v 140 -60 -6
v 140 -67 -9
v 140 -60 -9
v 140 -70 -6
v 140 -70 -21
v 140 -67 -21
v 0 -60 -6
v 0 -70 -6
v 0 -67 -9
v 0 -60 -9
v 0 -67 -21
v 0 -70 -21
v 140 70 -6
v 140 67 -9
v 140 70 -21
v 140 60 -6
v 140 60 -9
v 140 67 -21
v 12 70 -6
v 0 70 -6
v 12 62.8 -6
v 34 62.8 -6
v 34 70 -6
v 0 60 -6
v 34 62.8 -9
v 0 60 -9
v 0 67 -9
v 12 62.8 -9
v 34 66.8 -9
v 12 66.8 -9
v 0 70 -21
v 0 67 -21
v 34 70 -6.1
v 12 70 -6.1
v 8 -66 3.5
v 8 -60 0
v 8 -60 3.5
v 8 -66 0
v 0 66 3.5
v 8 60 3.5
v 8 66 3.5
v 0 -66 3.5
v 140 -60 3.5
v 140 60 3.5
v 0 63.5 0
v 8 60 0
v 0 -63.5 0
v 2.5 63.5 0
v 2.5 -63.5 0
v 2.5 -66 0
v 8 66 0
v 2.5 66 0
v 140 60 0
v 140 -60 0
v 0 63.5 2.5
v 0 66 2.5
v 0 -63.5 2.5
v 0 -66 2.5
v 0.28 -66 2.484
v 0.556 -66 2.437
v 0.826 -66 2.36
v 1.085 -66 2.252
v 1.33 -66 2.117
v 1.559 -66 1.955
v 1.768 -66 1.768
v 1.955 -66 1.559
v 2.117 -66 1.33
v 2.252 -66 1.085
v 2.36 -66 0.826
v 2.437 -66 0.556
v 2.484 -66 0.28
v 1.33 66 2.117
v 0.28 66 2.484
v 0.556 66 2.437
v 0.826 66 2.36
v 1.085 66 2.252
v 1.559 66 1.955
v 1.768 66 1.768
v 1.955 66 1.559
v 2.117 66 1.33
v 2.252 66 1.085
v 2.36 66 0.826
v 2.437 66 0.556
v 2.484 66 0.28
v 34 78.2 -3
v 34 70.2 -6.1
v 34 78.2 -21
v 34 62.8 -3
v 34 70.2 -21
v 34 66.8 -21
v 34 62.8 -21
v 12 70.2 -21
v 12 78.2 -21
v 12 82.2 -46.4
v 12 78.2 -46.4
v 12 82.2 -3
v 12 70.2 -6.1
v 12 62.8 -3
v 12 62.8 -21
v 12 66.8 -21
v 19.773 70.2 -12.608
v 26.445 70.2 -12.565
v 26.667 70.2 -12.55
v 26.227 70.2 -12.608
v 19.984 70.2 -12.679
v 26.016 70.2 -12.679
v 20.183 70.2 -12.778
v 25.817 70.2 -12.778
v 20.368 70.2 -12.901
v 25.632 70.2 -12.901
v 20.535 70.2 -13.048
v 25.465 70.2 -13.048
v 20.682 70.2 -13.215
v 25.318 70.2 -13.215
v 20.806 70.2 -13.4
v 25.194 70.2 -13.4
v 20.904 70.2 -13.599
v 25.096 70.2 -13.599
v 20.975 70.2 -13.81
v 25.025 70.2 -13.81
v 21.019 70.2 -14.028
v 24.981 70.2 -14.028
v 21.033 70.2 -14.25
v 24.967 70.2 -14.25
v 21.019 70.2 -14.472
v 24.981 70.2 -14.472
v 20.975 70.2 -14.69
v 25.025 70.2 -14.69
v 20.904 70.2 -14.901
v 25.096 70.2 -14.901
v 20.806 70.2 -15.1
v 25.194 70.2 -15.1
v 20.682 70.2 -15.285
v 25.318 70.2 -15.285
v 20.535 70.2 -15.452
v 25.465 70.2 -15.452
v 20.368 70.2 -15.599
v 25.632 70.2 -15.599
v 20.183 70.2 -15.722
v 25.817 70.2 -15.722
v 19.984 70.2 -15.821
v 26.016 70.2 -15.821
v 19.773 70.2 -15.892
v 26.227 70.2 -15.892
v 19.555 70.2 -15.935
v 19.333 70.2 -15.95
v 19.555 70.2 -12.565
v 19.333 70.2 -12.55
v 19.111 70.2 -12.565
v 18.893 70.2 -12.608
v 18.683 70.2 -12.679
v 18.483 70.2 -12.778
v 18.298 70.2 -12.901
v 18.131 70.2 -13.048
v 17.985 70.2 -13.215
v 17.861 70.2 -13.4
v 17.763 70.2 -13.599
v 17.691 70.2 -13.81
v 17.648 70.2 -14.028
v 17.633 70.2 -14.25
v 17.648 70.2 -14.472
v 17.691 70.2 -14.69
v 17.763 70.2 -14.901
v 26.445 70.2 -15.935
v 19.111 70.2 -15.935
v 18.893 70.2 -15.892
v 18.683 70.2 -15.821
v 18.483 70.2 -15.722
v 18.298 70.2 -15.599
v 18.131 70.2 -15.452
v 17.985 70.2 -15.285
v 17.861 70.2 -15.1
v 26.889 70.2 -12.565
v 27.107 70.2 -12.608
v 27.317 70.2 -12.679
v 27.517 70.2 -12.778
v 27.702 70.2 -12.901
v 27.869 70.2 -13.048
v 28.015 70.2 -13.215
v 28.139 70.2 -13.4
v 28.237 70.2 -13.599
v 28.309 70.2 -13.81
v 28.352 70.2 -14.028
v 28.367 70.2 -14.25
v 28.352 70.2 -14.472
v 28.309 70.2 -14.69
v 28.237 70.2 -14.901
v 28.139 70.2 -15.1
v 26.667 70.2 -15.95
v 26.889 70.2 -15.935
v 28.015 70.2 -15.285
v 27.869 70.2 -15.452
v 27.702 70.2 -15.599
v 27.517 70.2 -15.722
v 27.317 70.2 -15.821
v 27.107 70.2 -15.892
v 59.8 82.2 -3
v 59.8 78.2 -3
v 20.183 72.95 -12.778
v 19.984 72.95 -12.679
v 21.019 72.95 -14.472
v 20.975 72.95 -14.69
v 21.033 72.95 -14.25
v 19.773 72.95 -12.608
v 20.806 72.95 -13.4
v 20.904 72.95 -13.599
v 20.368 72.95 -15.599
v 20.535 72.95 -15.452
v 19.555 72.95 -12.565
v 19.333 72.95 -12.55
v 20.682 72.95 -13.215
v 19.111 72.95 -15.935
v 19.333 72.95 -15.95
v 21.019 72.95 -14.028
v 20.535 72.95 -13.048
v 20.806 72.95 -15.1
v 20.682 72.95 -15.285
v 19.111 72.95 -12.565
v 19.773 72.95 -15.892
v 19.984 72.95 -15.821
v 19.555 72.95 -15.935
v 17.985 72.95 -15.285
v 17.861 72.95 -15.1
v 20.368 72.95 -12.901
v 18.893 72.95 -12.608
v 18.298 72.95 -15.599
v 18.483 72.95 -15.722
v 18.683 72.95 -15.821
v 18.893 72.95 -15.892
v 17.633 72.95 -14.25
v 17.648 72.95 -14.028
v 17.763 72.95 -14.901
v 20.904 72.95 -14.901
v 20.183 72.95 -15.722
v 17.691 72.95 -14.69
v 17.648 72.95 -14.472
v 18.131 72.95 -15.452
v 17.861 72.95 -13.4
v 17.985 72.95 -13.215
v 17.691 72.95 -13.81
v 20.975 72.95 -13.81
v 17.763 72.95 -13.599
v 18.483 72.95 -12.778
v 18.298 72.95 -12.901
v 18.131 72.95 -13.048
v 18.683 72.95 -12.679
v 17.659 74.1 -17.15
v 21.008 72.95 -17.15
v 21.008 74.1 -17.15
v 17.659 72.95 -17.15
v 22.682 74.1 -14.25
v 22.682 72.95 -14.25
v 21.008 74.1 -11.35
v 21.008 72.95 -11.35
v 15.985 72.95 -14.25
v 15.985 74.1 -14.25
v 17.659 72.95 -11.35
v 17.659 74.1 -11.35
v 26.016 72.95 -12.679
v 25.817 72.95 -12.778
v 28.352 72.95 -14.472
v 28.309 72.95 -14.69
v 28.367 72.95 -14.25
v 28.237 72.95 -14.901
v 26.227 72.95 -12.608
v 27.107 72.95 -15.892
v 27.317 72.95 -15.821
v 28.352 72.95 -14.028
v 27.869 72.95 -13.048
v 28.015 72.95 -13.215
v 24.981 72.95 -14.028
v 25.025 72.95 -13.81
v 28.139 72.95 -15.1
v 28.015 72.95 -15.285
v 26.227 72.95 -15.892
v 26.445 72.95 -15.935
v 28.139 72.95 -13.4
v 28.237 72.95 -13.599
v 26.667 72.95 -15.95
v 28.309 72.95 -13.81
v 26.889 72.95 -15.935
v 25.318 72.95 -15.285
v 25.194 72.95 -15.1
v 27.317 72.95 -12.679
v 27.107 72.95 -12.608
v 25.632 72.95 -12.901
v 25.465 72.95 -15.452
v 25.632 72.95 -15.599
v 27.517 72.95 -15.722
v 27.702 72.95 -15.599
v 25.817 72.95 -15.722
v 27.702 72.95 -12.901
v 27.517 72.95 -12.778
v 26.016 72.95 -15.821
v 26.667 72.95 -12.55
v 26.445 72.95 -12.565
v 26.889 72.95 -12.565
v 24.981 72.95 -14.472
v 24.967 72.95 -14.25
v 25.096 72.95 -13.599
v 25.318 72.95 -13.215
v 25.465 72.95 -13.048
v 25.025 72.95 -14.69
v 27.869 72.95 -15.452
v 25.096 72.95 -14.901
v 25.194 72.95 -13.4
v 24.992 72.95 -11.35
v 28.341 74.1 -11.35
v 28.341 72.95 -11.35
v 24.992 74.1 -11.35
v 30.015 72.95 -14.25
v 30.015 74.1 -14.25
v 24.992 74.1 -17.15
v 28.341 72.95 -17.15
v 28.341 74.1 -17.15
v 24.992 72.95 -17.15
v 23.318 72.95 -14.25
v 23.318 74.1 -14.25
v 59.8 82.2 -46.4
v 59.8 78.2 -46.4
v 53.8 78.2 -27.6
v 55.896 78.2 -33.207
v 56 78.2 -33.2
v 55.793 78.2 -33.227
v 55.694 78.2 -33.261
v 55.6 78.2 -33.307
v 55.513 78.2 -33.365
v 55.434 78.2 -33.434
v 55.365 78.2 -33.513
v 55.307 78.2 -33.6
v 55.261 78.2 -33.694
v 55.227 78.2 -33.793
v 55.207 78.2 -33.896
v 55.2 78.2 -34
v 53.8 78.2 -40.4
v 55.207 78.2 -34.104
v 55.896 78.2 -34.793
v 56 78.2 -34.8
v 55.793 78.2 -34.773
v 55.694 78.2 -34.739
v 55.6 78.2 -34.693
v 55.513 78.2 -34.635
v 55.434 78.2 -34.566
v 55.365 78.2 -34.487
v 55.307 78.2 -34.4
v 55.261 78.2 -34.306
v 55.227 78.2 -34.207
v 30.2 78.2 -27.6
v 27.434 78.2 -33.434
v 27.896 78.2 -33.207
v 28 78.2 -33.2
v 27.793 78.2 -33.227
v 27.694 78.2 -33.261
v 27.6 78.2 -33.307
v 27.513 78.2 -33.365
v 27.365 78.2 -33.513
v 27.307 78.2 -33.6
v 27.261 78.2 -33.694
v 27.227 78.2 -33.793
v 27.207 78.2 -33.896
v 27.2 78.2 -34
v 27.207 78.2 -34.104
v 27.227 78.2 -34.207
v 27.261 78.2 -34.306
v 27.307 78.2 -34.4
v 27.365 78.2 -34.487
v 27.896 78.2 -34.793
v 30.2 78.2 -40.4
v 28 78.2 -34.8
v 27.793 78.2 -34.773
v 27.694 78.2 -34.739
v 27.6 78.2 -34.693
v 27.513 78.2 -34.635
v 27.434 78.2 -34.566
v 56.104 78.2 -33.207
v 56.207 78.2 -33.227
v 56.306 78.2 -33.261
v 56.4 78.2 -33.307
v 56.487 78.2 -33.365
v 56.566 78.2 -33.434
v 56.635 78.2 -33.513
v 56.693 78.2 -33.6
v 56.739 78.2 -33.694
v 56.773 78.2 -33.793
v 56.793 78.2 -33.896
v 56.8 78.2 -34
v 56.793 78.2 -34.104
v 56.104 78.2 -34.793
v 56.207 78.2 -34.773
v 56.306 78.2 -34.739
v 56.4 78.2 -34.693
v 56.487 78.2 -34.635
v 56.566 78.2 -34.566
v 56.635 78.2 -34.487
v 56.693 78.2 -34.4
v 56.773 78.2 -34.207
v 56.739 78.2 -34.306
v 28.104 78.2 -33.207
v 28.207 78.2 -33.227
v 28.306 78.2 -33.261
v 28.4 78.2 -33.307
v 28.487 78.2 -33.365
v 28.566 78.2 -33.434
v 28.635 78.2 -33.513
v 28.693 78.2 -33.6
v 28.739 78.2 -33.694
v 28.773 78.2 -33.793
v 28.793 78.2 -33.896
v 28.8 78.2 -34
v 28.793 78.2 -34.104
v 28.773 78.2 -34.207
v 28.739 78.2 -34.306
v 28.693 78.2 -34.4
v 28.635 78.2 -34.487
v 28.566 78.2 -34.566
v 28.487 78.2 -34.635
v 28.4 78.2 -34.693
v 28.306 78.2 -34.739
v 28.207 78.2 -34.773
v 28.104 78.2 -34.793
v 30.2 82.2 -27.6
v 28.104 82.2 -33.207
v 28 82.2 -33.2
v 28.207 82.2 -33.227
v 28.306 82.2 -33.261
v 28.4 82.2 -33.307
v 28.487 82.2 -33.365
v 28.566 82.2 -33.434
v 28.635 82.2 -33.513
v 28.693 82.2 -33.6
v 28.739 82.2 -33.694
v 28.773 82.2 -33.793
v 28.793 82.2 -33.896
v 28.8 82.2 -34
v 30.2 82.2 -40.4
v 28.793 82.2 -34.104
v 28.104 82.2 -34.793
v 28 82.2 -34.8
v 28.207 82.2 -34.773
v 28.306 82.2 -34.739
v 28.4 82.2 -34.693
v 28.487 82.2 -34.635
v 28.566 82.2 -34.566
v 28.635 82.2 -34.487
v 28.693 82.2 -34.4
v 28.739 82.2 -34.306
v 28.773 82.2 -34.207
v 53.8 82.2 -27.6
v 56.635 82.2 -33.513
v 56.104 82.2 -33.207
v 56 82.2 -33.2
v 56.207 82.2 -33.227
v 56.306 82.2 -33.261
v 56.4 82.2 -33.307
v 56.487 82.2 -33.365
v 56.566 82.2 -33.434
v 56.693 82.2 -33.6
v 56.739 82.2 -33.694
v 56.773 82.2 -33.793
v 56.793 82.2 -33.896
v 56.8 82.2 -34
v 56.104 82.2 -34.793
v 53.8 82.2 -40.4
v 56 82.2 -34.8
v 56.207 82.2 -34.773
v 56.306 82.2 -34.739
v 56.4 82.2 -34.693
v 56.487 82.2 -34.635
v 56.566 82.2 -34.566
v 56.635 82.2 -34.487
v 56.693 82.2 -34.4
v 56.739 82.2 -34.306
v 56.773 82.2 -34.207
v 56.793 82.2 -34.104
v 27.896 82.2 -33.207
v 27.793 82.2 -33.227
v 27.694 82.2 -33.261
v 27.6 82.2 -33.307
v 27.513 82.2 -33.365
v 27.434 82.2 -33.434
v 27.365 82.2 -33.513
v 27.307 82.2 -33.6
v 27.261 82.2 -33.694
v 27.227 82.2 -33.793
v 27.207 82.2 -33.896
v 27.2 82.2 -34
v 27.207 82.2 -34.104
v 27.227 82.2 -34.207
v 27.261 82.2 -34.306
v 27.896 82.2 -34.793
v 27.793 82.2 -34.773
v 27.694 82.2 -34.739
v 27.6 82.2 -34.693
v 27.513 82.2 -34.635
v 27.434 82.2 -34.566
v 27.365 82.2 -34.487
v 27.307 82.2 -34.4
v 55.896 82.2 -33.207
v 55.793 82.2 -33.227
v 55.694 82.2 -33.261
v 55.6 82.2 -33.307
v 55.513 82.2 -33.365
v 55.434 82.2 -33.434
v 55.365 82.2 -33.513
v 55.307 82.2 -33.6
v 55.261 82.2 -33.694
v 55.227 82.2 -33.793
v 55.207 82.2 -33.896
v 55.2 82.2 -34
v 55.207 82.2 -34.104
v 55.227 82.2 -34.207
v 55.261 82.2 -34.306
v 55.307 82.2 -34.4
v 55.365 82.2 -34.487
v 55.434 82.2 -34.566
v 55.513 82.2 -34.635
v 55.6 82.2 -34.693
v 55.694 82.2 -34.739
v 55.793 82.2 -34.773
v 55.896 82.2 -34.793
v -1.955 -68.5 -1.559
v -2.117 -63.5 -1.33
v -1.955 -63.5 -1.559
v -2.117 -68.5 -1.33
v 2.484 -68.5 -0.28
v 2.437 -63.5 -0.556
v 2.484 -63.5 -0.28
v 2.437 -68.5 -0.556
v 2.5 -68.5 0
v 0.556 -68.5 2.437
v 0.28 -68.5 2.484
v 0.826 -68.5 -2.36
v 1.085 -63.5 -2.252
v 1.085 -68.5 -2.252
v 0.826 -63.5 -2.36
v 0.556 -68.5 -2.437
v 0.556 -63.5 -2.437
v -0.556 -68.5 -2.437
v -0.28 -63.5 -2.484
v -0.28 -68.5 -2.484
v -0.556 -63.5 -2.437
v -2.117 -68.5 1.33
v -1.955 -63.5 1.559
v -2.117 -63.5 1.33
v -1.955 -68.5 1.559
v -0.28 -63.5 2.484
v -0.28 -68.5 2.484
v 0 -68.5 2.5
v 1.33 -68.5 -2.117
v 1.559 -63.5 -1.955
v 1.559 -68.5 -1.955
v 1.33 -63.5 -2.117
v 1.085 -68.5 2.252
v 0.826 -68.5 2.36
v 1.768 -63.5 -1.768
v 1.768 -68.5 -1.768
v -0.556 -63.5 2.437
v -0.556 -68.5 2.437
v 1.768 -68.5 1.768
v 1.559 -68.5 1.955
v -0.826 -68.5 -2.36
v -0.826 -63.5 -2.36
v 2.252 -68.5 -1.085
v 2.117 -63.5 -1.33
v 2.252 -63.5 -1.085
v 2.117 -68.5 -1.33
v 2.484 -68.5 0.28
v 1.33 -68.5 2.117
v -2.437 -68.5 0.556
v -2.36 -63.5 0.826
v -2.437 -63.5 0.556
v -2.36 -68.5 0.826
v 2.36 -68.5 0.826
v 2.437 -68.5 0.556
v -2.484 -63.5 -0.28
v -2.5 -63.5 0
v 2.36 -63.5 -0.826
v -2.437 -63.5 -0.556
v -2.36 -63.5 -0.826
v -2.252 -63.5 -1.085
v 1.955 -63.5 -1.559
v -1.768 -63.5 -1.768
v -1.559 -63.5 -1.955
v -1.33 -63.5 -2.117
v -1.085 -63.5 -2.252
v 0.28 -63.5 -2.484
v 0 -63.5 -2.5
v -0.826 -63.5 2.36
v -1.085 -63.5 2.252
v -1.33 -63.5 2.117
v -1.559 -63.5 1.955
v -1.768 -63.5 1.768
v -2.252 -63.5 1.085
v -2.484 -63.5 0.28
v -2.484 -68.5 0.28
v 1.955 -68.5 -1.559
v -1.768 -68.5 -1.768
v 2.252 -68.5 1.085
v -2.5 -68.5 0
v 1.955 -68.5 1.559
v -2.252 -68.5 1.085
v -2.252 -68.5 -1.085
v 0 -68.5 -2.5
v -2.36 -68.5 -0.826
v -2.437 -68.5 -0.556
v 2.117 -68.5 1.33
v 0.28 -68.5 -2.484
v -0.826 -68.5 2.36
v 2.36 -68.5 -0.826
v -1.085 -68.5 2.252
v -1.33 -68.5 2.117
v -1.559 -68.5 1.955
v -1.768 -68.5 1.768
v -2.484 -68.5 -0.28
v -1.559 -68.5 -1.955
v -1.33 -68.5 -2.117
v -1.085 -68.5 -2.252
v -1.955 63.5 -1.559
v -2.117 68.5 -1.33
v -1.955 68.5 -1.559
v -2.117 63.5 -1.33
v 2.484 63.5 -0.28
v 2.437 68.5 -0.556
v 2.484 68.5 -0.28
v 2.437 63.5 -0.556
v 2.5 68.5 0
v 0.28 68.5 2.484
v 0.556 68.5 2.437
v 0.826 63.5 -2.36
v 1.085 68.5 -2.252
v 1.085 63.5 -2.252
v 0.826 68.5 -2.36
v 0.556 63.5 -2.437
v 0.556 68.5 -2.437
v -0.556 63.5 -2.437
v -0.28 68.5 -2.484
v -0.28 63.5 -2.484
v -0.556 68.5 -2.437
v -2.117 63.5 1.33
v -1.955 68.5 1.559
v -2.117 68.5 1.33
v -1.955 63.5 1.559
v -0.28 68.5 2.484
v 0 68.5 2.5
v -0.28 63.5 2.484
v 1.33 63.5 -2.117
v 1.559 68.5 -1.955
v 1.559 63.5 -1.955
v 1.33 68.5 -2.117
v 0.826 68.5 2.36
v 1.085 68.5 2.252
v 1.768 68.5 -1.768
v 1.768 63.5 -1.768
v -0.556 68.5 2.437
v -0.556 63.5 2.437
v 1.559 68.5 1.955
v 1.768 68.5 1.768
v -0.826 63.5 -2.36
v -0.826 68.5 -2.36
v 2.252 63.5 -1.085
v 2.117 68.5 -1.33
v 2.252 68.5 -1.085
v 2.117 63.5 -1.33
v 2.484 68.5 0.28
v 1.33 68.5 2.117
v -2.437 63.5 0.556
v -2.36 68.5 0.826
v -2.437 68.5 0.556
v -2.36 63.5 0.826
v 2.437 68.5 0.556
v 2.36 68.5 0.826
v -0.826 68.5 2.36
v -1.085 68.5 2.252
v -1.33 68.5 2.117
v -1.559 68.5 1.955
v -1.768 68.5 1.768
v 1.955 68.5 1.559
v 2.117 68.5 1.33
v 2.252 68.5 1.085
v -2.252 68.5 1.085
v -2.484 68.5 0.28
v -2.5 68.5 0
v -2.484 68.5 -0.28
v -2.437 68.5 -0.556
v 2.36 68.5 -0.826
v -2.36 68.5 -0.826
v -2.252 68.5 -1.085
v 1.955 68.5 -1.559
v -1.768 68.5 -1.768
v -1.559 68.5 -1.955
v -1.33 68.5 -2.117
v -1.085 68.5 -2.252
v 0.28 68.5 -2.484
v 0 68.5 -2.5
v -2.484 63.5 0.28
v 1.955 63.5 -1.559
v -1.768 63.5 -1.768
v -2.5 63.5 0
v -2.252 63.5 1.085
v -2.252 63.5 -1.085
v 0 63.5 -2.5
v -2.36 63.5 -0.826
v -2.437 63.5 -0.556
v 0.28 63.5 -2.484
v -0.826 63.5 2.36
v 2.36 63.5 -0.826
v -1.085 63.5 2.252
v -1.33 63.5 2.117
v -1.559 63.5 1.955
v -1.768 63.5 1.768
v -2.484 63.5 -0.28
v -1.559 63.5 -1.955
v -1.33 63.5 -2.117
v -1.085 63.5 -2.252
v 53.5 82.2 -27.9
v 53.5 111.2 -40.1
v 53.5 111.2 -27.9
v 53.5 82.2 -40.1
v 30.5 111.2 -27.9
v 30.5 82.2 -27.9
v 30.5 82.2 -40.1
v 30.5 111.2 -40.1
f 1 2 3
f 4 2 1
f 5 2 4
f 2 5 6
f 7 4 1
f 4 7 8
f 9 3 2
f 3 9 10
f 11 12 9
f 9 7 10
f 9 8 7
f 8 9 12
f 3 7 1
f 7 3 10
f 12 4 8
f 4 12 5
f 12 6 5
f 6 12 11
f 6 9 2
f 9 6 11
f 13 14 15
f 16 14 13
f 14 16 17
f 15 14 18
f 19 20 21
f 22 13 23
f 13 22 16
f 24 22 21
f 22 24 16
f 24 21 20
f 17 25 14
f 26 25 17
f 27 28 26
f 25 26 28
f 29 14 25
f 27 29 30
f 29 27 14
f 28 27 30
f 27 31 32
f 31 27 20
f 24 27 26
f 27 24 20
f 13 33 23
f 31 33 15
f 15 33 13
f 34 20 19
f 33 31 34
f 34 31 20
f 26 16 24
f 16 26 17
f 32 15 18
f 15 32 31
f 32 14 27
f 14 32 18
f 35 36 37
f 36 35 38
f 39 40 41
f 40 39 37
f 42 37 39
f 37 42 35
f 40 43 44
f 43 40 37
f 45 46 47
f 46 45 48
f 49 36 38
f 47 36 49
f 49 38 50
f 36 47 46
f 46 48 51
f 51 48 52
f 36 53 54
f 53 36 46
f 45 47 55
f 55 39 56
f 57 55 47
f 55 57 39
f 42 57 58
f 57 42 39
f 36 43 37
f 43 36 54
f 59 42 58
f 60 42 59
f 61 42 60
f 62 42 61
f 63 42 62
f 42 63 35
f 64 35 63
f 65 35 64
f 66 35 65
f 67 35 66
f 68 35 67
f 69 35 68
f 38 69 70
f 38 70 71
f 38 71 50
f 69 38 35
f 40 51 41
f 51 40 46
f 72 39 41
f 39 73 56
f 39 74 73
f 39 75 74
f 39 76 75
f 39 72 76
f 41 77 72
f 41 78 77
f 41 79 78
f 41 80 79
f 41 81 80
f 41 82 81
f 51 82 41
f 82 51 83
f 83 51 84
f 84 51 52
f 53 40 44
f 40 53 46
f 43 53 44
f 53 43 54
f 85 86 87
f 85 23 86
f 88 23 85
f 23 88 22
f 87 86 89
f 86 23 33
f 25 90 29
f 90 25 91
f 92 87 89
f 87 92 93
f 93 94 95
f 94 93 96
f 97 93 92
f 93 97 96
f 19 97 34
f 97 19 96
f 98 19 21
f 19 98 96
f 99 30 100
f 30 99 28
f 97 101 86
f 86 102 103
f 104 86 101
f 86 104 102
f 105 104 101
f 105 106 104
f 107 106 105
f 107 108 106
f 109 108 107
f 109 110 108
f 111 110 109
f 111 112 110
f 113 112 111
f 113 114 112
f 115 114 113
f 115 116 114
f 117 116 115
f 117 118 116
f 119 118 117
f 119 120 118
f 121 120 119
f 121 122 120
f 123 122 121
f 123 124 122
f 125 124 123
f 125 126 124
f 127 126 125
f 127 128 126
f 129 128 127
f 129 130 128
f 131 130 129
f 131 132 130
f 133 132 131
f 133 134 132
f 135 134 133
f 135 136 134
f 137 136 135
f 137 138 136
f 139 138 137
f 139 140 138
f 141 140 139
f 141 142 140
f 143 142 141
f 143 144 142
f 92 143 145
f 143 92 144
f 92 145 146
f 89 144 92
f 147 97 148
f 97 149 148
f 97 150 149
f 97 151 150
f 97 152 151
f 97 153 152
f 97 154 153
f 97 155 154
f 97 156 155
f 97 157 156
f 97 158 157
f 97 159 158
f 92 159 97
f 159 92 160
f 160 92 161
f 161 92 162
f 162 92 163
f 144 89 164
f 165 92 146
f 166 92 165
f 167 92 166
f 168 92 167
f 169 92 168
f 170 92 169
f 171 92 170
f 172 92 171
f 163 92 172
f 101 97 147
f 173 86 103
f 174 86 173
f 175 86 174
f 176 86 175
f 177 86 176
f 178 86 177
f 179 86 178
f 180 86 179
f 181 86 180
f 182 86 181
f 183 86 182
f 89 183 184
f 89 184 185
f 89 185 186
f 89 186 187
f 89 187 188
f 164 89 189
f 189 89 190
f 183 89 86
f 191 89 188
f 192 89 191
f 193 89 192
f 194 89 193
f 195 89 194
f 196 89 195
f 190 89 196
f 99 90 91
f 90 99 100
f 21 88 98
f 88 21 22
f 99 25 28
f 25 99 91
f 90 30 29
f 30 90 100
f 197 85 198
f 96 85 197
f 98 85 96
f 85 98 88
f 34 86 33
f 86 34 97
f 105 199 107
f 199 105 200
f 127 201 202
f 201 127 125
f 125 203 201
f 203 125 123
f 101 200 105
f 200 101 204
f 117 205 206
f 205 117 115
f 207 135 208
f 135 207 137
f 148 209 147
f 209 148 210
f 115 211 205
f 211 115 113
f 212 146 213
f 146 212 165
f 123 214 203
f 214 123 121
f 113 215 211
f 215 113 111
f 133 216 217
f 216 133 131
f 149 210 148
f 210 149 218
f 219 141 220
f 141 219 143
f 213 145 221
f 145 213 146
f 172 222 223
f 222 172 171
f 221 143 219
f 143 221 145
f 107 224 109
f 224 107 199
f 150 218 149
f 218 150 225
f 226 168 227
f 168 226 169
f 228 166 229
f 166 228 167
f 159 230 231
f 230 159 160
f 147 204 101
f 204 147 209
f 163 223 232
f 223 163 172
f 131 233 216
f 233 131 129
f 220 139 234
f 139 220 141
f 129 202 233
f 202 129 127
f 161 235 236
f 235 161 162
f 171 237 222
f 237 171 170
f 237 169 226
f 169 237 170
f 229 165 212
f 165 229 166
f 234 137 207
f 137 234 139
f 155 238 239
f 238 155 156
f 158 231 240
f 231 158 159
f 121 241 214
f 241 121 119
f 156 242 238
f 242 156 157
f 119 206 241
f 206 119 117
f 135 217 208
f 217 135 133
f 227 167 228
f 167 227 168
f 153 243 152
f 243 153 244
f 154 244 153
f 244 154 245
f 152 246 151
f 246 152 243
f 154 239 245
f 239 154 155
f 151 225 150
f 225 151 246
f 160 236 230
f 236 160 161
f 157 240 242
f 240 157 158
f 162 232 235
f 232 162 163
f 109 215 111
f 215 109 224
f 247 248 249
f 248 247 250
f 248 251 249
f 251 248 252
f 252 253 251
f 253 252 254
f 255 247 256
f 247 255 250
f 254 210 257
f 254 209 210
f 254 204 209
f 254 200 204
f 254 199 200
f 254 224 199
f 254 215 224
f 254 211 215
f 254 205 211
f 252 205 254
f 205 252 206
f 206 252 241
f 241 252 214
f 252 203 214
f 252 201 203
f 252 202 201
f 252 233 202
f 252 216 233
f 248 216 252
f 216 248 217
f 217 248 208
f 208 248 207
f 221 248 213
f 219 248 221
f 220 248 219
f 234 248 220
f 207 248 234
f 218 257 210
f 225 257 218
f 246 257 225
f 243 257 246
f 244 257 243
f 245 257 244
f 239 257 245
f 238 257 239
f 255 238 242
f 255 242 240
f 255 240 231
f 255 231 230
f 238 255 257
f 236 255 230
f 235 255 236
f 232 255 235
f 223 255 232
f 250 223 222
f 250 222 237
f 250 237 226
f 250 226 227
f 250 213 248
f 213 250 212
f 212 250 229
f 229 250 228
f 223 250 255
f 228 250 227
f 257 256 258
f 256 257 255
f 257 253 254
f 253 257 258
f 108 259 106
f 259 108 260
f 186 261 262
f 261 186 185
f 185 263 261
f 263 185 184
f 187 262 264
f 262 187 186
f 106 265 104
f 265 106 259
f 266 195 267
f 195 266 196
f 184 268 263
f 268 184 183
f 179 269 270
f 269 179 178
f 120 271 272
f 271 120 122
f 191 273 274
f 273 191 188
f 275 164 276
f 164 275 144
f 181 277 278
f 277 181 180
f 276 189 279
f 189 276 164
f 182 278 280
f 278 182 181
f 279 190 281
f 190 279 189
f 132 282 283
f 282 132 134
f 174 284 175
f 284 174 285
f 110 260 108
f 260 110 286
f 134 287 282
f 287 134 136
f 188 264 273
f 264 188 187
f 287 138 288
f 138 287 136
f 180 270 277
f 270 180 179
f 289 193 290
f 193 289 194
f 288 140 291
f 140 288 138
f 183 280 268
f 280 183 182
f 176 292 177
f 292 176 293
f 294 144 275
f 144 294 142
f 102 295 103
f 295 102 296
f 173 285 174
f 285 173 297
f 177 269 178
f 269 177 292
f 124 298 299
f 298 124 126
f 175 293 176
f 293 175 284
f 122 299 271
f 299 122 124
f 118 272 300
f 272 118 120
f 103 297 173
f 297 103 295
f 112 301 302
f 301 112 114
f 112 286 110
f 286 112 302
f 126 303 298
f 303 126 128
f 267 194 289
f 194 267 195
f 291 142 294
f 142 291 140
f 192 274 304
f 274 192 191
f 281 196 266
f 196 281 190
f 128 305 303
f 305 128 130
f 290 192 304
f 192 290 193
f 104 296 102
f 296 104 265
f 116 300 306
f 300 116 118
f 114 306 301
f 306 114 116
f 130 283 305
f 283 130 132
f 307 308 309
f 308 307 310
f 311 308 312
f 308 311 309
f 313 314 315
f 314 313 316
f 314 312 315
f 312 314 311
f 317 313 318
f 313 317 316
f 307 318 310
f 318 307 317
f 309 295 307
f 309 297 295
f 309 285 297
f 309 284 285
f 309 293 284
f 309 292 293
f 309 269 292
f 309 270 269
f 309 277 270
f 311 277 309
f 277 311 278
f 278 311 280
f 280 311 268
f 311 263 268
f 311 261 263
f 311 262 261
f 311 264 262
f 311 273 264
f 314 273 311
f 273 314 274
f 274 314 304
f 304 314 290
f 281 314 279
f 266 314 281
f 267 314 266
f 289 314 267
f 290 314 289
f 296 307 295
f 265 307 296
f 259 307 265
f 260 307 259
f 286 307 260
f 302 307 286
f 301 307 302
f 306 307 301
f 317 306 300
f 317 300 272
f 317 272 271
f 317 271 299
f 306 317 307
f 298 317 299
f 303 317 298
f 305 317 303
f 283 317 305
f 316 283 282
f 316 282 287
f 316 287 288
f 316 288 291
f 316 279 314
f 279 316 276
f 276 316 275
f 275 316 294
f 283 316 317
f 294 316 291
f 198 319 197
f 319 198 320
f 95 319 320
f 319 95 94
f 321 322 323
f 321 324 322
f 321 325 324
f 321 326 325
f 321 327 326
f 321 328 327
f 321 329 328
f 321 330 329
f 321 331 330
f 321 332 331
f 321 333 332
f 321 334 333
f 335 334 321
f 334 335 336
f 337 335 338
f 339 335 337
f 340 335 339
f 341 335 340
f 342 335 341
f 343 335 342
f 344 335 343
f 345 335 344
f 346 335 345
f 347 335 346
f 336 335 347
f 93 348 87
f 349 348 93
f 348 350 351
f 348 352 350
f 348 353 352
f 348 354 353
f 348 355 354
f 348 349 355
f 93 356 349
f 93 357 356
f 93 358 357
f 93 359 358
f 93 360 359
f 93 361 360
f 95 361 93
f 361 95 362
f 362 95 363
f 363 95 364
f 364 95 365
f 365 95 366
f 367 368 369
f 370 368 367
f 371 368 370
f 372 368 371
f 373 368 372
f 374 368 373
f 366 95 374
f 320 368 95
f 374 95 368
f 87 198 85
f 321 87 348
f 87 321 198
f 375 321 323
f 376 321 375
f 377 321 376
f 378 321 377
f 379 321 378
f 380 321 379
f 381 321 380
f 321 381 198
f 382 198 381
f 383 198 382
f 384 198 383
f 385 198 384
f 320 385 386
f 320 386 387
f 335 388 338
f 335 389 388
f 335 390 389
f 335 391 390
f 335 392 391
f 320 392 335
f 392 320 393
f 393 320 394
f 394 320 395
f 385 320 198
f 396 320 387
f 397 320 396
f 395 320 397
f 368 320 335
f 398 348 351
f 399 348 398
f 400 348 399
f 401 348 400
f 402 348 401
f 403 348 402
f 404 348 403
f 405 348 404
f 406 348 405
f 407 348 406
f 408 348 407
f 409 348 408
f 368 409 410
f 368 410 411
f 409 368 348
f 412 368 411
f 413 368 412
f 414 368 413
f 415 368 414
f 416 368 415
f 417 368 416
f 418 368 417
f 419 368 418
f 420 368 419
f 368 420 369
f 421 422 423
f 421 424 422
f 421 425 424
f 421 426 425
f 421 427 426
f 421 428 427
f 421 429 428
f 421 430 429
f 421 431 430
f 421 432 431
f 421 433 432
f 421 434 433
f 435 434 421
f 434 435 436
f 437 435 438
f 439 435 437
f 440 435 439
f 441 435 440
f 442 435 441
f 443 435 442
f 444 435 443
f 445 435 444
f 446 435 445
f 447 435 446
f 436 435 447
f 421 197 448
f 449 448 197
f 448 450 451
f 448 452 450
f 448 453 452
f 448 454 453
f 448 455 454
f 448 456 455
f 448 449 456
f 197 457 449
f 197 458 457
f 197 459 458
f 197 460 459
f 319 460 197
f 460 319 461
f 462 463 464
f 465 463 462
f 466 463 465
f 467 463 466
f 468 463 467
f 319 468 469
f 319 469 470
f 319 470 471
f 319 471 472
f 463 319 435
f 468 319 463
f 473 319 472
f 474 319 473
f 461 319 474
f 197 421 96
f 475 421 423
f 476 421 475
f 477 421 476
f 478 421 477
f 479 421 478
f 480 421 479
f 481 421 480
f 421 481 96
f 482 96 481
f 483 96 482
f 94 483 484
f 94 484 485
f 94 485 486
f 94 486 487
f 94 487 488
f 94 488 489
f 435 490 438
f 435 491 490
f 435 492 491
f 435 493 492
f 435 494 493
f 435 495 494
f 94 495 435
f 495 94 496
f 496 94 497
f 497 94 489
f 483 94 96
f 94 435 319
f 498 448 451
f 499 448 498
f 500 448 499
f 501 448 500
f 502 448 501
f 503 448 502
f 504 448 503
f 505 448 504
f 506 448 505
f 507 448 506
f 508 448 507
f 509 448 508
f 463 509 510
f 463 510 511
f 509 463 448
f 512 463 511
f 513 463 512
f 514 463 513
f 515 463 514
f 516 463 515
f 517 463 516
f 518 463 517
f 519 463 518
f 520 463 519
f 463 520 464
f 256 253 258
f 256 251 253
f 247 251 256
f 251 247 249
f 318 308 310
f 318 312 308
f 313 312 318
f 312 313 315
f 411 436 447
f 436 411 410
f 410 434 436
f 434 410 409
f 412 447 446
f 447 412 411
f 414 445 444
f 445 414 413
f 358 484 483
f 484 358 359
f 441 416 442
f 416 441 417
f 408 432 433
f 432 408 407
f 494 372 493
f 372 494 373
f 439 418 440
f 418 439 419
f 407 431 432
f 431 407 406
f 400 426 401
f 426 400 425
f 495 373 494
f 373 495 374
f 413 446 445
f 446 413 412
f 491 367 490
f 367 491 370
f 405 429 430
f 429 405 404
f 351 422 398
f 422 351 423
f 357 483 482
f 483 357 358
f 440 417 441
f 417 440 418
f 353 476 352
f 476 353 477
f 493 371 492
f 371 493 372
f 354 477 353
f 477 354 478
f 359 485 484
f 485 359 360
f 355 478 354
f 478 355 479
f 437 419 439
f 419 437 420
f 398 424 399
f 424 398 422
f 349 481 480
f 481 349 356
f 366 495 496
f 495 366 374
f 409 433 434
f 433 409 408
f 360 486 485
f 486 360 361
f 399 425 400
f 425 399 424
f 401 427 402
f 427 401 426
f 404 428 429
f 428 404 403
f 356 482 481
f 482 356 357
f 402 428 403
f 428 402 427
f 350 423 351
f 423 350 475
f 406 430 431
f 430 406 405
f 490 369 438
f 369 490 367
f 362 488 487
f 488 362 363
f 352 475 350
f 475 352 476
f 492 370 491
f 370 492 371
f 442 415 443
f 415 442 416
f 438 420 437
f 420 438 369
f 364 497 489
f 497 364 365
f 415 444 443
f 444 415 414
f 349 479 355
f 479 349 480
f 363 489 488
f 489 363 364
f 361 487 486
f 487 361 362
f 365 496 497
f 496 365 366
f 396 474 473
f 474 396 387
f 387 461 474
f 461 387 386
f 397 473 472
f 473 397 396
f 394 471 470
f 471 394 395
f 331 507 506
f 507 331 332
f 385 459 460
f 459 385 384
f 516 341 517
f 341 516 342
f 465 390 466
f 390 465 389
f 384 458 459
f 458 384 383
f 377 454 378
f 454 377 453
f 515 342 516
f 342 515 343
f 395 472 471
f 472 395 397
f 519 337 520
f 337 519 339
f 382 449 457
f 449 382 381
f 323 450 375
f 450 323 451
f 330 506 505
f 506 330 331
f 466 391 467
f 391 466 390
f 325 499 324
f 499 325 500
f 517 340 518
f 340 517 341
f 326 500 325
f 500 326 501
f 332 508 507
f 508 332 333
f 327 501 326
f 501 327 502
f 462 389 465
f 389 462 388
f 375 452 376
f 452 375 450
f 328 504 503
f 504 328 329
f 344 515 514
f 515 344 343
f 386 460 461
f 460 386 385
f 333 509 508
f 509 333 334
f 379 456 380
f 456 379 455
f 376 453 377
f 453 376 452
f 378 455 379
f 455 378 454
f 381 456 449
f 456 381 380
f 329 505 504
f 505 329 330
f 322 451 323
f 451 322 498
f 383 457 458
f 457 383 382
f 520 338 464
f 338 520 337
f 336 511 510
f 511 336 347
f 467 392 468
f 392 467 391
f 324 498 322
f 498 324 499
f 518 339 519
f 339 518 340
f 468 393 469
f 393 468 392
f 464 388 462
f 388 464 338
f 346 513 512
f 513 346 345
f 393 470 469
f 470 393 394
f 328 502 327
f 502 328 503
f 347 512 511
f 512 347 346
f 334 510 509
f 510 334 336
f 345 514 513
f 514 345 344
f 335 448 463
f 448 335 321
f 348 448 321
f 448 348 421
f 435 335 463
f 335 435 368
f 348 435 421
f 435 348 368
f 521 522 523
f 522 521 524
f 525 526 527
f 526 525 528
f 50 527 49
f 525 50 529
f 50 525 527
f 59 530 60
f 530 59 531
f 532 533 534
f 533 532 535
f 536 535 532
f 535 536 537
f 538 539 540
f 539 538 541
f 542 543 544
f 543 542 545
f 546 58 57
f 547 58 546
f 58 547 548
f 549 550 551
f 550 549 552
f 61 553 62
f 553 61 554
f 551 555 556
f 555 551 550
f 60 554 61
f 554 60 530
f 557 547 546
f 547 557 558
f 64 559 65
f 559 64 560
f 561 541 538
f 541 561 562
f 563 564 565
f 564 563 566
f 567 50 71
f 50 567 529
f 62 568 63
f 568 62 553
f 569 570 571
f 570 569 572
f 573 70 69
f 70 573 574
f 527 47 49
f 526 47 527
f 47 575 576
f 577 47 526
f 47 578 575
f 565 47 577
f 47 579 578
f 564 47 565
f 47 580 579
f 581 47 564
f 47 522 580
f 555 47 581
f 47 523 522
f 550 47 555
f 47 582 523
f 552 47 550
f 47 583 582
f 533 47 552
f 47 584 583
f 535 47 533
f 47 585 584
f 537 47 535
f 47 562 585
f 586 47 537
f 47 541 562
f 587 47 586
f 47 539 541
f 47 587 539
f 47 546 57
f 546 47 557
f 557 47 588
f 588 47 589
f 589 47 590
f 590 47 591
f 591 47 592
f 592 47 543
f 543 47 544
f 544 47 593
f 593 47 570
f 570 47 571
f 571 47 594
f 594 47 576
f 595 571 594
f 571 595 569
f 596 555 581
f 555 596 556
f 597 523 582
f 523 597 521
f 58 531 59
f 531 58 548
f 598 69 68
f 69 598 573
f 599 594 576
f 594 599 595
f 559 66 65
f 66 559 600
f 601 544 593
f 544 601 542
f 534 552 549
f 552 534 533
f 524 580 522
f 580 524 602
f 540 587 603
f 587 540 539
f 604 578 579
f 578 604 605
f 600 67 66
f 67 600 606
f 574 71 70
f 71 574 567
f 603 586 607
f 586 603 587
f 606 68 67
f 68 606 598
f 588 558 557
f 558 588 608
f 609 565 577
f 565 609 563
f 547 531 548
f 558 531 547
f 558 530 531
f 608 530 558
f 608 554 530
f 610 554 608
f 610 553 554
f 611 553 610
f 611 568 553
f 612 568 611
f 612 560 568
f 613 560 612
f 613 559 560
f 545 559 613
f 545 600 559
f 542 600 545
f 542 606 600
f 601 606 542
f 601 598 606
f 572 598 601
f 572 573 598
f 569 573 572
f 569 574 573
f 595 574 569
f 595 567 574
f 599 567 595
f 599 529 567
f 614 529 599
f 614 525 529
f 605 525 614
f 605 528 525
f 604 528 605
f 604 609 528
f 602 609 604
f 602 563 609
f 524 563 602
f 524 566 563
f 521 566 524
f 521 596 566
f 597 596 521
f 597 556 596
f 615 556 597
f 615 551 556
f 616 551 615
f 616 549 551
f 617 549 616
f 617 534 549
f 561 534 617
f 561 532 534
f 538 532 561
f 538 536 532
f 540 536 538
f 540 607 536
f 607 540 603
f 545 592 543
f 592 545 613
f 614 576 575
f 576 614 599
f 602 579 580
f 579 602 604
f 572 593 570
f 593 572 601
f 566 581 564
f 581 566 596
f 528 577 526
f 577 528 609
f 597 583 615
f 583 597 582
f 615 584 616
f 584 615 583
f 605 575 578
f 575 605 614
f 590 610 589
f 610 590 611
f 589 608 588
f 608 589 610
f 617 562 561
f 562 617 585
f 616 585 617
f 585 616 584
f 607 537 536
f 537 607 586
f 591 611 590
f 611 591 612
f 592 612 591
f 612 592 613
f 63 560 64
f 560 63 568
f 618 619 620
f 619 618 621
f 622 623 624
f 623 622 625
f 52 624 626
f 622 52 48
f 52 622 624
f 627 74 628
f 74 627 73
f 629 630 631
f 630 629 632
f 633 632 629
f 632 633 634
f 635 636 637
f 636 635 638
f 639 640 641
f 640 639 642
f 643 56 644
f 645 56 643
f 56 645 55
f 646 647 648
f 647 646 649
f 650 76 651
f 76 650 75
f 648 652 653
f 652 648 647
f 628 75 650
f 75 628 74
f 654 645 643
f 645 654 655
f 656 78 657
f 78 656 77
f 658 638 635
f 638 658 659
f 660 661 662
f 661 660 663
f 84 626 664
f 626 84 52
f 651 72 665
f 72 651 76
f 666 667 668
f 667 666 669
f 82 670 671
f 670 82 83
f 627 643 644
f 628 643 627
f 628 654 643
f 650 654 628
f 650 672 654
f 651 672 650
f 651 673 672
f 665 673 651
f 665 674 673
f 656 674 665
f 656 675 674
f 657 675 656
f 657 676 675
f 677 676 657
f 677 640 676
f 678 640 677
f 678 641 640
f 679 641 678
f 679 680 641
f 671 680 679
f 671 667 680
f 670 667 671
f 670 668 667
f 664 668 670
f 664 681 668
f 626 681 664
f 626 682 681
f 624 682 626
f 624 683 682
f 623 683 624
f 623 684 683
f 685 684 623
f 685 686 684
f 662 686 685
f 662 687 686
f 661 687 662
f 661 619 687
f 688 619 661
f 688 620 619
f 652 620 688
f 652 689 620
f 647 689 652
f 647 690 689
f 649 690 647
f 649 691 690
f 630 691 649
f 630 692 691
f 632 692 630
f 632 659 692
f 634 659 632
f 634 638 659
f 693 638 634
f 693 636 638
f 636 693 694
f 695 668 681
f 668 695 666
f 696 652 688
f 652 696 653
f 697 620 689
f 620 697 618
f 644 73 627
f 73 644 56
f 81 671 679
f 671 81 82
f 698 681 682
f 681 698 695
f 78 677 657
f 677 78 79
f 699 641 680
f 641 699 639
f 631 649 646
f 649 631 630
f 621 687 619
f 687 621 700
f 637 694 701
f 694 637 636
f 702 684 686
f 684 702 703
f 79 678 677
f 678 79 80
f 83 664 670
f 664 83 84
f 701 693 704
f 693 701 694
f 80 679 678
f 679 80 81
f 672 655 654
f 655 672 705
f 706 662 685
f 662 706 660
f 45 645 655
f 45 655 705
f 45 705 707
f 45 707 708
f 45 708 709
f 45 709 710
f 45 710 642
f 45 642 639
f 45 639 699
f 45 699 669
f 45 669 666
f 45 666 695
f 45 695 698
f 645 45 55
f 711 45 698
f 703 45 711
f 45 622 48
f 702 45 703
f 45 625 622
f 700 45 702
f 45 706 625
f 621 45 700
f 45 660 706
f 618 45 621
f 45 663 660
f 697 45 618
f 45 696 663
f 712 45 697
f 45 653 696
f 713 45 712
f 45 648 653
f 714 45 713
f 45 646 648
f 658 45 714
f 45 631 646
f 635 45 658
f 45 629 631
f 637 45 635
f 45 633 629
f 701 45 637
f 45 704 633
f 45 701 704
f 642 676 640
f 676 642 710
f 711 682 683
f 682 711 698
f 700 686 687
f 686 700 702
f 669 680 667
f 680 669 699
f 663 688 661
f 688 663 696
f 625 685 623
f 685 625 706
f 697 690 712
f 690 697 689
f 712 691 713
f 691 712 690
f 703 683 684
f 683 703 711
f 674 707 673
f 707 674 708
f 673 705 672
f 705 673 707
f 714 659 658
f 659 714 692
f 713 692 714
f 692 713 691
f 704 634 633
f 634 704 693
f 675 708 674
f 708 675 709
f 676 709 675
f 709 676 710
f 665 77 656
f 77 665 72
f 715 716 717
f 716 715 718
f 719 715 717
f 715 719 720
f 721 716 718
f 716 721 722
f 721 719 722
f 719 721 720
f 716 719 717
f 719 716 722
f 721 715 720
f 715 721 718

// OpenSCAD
// file: ../servo_mount.scad
// Provisional side-rim mount. Local X runs inward from the hinge plane,
// local Y runs inward from the selected side wall, and Z points up.
// Printable output is laid on its broad X/Z face; no measured side-rim fit is claimed.
include <parameters.scad>

$fn = 48;
eps = 0.04;
side_outer = side_clamp_gap / 2 + side_clamp_wall;
side_body_center_x = side_servo_shaft_x - servo_shaft_offset_x;
side_body_center_z = side_servo_shaft_z - side_rim_top_z;
side_aperture_x = servo_body_x + 2 * body_clearance_per_side;
side_aperture_z = servo_body_y + 2 * body_clearance_per_side;
side_plate_left = min(side_clamp_start_x,
                      side_body_center_x - side_aperture_x / 2 - side_servo_plate_margin);
side_plate_right = side_body_center_x + side_aperture_x / 2 + side_servo_plate_margin;
side_plate_bottom = side_body_center_z - side_aperture_z / 2 - side_servo_plate_margin;
side_plate_top = max(side_clamp_bridge,
                     side_body_center_z + side_aperture_z / 2 + side_servo_plate_margin);
side_plate_inner_y = -side_outer - side_servo_plate_outset;
side_plate_outer_y = side_plate_inner_y - side_servo_plate_thickness;

assert(mount_side == "left" || mount_side == "right");
assert(side_clamp_gap >= side_rim_wall_thickness);
assert(side_clamp_length >= 16 && side_rim_grip_depth >= 10);
assert(side_plate_left < side_clamp_start_x + side_clamp_length);
assert(side_plate_bottom < -side_rim_grip_depth);
assert(servo_ear_hole_pitch / 2 - servo_ear_pilot_d / 2 > side_aperture_x / 2);

module side_rim_clamp(length = side_clamp_length, screws = 2) {
    difference() {
        union() {
            // U section over a PROVISIONAL upright side-rim wall.
            translate([0, -side_outer, -side_rim_grip_depth])
                cube([length, side_clamp_wall, side_rim_grip_depth + 0.15]);
            translate([0, side_clamp_gap / 2, -side_rim_grip_depth])
                cube([length, side_clamp_wall, side_rim_grip_depth + 0.15]);
            translate([0, -side_outer, -0.1])
                cube([length, 2 * side_outer, side_clamp_bridge + 0.1]);
            // Extra outside material keeps the nut pocket within the jaw.
            translate([0, -side_outer - 1.5, -side_rim_grip_depth * 0.78])
                cube([length, 1.5, side_rim_grip_depth * 0.55]);
        }
        for (i = [1 : screws]) {
            sx = length * i / (screws + 1);
            sz = -side_rim_grip_depth * 0.55;
            translate([sx, -side_outer - 1.6, sz])
                rotate([-90, 0, 0])
                    cylinder(d = side_clamp_screw_d, h = side_clamp_wall + 1.8);
            translate([sx, -side_outer - 1.55, sz])
                rotate([-90, 0, 0])
                    cylinder(d = side_clamp_nut_af / cos(30),
                             h = side_clamp_nut_depth, $fn = 6);
        }
    }
}

module side_servo_mount() {
    difference() {
        union() {
            translate([side_clamp_start_x, 0, 0]) side_rim_clamp();
            // Servo ear plate and aperture face the outside of the bin.
            translate([side_plate_left, side_plate_outer_y, side_plate_bottom])
                cube([side_plate_right - side_plate_left,
                      side_servo_plate_thickness,
                      side_plate_top - side_plate_bottom]);
            // Continuous web ties the whole clamp length to the plate so the
            // exterior jaw is supported when the plate face is on the bed.
            translate([side_clamp_start_x, side_plate_inner_y - 0.1,
                       -side_rim_grip_depth])
                cube([side_clamp_length,
                      -side_outer - side_plate_inner_y + 0.2,
                      side_rim_grip_depth + side_clamp_bridge]);
        }
        translate([side_body_center_x - side_aperture_x / 2,
                   side_plate_outer_y - eps,
                   side_body_center_z - side_aperture_z / 2])
            cube([side_aperture_x,
                  side_servo_plate_thickness + 2 * eps,
                  side_aperture_z]);
        for (sx = [-1, 1])
            translate([side_body_center_x + sx * servo_ear_hole_pitch / 2,
                       side_plate_outer_y - eps, side_body_center_z])
                rotate([-90, 0, 0])
                    cylinder(d = servo_ear_pilot_d,
                             h = side_servo_plate_thickness + 2 * eps);
    }
}

// Reorient the broad X/Z profile onto the print bed.
translate([0, 0, -side_plate_outer_y]) rotate([90, 0, 0]) side_servo_mount();
// main file
// Side-mount clearance concept for the bin's TWO original corner hinges.
// This intentionally omits the provisional horn/rod: linkage pivots cannot be
// set until the physical hinge, lid, and side-rim measurements are confirmed.
// X runs from hinge toward the bin front, Y from left to right, Z upward.
include <../parameters.scad>
use <../servo_mount.scad>

$fn = 56;
pose_override = 0; // render with -D 'pose_override=0', 45, or 90
pose = pose_override;
side_sign = mount_side == "right" ? 1 : -1;
side_outer = side_clamp_gap / 2 + side_clamp_wall;
side_body_center_x = side_servo_shaft_x - servo_shaft_offset_x;
side_body_center_z = side_servo_shaft_z - side_rim_top_z;
side_plate_outer_y = -side_outer - side_servo_plate_outset - side_servo_plate_thickness;
side_wall_center_y = bin_outer_width / 2 - side_clamp_wall_center_from_outer_edge;
modeled_lid_half_width = bin_outer_width / 2 - lid_edge_inset;
modeled_mount_inner_y = side_wall_center_y - side_outer;
modeled_lateral_clearance = modeled_mount_inner_y - modeled_lid_half_width;
modeled_hinge_x_clearance = side_clamp_start_x - hinge_knuckle_radius;
modeled_tab_length = min(8, side_clamp_start_x - hinge_knuckle_radius - 1);
modeled_tab_x_clearance = side_clamp_start_x - modeled_tab_length;

module hinge_knuckle(y) {
    color([0.28, 0.37, 0.43])
        translate([hinge_axis_x, y - hinge_knuckle_length / 2, hinge_axis_z])
            rotate([-90, 0, 0])
                cylinder(r = hinge_knuckle_radius, h = hinge_knuckle_length);
}

module fixed_side_rims() {
    for (s = [-1, 1]) {
        // These translucent surfaces are PROVISIONAL envelopes, not measured profiles.
        color([0.72, 0.79, 0.82, 0.35])
            translate([0, s > 0 ? bin_outer_width / 2 - side_rim_top_width
                                  : -bin_outer_width / 2,
                       side_rim_top_z - 3])
                cube([bin_outer_depth, side_rim_top_width, 3]);
        color([0.52, 0.62, 0.68, 0.38])
            translate([0, s * side_wall_center_y - side_rim_wall_thickness / 2,
                       side_rim_top_z - side_rim_grip_depth])
                cube([bin_outer_depth, side_rim_wall_thickness,
                      side_rim_grip_depth]);
    }
}

module moving_lid(a) {
    color([0.38, 0.68, 0.85, 0.36])
        translate([hinge_axis_x, 0, hinge_axis_z])
            rotate([0, -a, 0])
                union() {
                    translate([0, -modeled_lid_half_width, 0])
                        cube([bin_outer_depth, 2 * modeled_lid_half_width,
                              lid_thickness]);
                    // Short corner tabs connect the lid to each existing pivot.
                    for (s = [-1, 1])
                        translate([0, s > 0 ? modeled_lid_half_width
                                              : -bin_outer_width / 2 + hinge_side_inset,
                                   0])
                            cube([modeled_tab_length,
                                  bin_outer_width / 2 - hinge_side_inset - modeled_lid_half_width,
                                  lid_thickness]);
                }
}

module side_mount_world() {
    // The side wall centre is the local Y=0 plane. Local negative Y is outside.
    translate([0, side_sign * side_wall_center_y, side_rim_top_z])
        scale([1, -side_sign, 1])
            color("SlateGray") side_servo_mount();
}

module servo_envelope() {
    // Schematic case only; the actual servo and cable must be measured.
    translate([0, side_sign * side_wall_center_y, side_rim_top_z])
        scale([1, -side_sign, 1])
            color([0.15, 0.25, 0.68, 0.34])
                translate([side_body_center_x - servo_body_x / 2,
                           side_plate_outer_y - servo_body_z,
                           side_body_center_z - servo_body_y / 2])
                    cube([servo_body_x, servo_body_z, servo_body_y]);
}

module assembly(a = pose) {
    assert(a >= 0 && a <= lid_open_angle);
    assert(side_clamp_wall_center_from_outer_edge < side_rim_top_width,
           "Selected side wall centre lies beyond the side-rim width");
    assert(modeled_lateral_clearance > 0,
           "Modeled side mount enters the lid's lateral envelope");
    assert(modeled_hinge_x_clearance > 0,
           "Modeled side clamp enters the hinge-knuckle X envelope");
    assert(modeled_tab_x_clearance > 0,
           "Modeled side clamp enters a lid hinge tab's X envelope");
    fixed_side_rims();
    hinge_knuckle(-bin_outer_width / 2 + hinge_side_inset);
    hinge_knuckle( bin_outer_width / 2 - hinge_side_inset);
    moving_lid(a);
    side_mount_world();
    servo_envelope();
    echo(str("POSE ", a, " deg; PROVISIONAL lateral lid/mount gap ",
             modeled_lateral_clearance, " mm; hinge-X gap ",
             modeled_hinge_x_clearance, " mm; hinge-tab-X gap ",
             modeled_tab_x_clearance, " mm"));
}

assembly();
